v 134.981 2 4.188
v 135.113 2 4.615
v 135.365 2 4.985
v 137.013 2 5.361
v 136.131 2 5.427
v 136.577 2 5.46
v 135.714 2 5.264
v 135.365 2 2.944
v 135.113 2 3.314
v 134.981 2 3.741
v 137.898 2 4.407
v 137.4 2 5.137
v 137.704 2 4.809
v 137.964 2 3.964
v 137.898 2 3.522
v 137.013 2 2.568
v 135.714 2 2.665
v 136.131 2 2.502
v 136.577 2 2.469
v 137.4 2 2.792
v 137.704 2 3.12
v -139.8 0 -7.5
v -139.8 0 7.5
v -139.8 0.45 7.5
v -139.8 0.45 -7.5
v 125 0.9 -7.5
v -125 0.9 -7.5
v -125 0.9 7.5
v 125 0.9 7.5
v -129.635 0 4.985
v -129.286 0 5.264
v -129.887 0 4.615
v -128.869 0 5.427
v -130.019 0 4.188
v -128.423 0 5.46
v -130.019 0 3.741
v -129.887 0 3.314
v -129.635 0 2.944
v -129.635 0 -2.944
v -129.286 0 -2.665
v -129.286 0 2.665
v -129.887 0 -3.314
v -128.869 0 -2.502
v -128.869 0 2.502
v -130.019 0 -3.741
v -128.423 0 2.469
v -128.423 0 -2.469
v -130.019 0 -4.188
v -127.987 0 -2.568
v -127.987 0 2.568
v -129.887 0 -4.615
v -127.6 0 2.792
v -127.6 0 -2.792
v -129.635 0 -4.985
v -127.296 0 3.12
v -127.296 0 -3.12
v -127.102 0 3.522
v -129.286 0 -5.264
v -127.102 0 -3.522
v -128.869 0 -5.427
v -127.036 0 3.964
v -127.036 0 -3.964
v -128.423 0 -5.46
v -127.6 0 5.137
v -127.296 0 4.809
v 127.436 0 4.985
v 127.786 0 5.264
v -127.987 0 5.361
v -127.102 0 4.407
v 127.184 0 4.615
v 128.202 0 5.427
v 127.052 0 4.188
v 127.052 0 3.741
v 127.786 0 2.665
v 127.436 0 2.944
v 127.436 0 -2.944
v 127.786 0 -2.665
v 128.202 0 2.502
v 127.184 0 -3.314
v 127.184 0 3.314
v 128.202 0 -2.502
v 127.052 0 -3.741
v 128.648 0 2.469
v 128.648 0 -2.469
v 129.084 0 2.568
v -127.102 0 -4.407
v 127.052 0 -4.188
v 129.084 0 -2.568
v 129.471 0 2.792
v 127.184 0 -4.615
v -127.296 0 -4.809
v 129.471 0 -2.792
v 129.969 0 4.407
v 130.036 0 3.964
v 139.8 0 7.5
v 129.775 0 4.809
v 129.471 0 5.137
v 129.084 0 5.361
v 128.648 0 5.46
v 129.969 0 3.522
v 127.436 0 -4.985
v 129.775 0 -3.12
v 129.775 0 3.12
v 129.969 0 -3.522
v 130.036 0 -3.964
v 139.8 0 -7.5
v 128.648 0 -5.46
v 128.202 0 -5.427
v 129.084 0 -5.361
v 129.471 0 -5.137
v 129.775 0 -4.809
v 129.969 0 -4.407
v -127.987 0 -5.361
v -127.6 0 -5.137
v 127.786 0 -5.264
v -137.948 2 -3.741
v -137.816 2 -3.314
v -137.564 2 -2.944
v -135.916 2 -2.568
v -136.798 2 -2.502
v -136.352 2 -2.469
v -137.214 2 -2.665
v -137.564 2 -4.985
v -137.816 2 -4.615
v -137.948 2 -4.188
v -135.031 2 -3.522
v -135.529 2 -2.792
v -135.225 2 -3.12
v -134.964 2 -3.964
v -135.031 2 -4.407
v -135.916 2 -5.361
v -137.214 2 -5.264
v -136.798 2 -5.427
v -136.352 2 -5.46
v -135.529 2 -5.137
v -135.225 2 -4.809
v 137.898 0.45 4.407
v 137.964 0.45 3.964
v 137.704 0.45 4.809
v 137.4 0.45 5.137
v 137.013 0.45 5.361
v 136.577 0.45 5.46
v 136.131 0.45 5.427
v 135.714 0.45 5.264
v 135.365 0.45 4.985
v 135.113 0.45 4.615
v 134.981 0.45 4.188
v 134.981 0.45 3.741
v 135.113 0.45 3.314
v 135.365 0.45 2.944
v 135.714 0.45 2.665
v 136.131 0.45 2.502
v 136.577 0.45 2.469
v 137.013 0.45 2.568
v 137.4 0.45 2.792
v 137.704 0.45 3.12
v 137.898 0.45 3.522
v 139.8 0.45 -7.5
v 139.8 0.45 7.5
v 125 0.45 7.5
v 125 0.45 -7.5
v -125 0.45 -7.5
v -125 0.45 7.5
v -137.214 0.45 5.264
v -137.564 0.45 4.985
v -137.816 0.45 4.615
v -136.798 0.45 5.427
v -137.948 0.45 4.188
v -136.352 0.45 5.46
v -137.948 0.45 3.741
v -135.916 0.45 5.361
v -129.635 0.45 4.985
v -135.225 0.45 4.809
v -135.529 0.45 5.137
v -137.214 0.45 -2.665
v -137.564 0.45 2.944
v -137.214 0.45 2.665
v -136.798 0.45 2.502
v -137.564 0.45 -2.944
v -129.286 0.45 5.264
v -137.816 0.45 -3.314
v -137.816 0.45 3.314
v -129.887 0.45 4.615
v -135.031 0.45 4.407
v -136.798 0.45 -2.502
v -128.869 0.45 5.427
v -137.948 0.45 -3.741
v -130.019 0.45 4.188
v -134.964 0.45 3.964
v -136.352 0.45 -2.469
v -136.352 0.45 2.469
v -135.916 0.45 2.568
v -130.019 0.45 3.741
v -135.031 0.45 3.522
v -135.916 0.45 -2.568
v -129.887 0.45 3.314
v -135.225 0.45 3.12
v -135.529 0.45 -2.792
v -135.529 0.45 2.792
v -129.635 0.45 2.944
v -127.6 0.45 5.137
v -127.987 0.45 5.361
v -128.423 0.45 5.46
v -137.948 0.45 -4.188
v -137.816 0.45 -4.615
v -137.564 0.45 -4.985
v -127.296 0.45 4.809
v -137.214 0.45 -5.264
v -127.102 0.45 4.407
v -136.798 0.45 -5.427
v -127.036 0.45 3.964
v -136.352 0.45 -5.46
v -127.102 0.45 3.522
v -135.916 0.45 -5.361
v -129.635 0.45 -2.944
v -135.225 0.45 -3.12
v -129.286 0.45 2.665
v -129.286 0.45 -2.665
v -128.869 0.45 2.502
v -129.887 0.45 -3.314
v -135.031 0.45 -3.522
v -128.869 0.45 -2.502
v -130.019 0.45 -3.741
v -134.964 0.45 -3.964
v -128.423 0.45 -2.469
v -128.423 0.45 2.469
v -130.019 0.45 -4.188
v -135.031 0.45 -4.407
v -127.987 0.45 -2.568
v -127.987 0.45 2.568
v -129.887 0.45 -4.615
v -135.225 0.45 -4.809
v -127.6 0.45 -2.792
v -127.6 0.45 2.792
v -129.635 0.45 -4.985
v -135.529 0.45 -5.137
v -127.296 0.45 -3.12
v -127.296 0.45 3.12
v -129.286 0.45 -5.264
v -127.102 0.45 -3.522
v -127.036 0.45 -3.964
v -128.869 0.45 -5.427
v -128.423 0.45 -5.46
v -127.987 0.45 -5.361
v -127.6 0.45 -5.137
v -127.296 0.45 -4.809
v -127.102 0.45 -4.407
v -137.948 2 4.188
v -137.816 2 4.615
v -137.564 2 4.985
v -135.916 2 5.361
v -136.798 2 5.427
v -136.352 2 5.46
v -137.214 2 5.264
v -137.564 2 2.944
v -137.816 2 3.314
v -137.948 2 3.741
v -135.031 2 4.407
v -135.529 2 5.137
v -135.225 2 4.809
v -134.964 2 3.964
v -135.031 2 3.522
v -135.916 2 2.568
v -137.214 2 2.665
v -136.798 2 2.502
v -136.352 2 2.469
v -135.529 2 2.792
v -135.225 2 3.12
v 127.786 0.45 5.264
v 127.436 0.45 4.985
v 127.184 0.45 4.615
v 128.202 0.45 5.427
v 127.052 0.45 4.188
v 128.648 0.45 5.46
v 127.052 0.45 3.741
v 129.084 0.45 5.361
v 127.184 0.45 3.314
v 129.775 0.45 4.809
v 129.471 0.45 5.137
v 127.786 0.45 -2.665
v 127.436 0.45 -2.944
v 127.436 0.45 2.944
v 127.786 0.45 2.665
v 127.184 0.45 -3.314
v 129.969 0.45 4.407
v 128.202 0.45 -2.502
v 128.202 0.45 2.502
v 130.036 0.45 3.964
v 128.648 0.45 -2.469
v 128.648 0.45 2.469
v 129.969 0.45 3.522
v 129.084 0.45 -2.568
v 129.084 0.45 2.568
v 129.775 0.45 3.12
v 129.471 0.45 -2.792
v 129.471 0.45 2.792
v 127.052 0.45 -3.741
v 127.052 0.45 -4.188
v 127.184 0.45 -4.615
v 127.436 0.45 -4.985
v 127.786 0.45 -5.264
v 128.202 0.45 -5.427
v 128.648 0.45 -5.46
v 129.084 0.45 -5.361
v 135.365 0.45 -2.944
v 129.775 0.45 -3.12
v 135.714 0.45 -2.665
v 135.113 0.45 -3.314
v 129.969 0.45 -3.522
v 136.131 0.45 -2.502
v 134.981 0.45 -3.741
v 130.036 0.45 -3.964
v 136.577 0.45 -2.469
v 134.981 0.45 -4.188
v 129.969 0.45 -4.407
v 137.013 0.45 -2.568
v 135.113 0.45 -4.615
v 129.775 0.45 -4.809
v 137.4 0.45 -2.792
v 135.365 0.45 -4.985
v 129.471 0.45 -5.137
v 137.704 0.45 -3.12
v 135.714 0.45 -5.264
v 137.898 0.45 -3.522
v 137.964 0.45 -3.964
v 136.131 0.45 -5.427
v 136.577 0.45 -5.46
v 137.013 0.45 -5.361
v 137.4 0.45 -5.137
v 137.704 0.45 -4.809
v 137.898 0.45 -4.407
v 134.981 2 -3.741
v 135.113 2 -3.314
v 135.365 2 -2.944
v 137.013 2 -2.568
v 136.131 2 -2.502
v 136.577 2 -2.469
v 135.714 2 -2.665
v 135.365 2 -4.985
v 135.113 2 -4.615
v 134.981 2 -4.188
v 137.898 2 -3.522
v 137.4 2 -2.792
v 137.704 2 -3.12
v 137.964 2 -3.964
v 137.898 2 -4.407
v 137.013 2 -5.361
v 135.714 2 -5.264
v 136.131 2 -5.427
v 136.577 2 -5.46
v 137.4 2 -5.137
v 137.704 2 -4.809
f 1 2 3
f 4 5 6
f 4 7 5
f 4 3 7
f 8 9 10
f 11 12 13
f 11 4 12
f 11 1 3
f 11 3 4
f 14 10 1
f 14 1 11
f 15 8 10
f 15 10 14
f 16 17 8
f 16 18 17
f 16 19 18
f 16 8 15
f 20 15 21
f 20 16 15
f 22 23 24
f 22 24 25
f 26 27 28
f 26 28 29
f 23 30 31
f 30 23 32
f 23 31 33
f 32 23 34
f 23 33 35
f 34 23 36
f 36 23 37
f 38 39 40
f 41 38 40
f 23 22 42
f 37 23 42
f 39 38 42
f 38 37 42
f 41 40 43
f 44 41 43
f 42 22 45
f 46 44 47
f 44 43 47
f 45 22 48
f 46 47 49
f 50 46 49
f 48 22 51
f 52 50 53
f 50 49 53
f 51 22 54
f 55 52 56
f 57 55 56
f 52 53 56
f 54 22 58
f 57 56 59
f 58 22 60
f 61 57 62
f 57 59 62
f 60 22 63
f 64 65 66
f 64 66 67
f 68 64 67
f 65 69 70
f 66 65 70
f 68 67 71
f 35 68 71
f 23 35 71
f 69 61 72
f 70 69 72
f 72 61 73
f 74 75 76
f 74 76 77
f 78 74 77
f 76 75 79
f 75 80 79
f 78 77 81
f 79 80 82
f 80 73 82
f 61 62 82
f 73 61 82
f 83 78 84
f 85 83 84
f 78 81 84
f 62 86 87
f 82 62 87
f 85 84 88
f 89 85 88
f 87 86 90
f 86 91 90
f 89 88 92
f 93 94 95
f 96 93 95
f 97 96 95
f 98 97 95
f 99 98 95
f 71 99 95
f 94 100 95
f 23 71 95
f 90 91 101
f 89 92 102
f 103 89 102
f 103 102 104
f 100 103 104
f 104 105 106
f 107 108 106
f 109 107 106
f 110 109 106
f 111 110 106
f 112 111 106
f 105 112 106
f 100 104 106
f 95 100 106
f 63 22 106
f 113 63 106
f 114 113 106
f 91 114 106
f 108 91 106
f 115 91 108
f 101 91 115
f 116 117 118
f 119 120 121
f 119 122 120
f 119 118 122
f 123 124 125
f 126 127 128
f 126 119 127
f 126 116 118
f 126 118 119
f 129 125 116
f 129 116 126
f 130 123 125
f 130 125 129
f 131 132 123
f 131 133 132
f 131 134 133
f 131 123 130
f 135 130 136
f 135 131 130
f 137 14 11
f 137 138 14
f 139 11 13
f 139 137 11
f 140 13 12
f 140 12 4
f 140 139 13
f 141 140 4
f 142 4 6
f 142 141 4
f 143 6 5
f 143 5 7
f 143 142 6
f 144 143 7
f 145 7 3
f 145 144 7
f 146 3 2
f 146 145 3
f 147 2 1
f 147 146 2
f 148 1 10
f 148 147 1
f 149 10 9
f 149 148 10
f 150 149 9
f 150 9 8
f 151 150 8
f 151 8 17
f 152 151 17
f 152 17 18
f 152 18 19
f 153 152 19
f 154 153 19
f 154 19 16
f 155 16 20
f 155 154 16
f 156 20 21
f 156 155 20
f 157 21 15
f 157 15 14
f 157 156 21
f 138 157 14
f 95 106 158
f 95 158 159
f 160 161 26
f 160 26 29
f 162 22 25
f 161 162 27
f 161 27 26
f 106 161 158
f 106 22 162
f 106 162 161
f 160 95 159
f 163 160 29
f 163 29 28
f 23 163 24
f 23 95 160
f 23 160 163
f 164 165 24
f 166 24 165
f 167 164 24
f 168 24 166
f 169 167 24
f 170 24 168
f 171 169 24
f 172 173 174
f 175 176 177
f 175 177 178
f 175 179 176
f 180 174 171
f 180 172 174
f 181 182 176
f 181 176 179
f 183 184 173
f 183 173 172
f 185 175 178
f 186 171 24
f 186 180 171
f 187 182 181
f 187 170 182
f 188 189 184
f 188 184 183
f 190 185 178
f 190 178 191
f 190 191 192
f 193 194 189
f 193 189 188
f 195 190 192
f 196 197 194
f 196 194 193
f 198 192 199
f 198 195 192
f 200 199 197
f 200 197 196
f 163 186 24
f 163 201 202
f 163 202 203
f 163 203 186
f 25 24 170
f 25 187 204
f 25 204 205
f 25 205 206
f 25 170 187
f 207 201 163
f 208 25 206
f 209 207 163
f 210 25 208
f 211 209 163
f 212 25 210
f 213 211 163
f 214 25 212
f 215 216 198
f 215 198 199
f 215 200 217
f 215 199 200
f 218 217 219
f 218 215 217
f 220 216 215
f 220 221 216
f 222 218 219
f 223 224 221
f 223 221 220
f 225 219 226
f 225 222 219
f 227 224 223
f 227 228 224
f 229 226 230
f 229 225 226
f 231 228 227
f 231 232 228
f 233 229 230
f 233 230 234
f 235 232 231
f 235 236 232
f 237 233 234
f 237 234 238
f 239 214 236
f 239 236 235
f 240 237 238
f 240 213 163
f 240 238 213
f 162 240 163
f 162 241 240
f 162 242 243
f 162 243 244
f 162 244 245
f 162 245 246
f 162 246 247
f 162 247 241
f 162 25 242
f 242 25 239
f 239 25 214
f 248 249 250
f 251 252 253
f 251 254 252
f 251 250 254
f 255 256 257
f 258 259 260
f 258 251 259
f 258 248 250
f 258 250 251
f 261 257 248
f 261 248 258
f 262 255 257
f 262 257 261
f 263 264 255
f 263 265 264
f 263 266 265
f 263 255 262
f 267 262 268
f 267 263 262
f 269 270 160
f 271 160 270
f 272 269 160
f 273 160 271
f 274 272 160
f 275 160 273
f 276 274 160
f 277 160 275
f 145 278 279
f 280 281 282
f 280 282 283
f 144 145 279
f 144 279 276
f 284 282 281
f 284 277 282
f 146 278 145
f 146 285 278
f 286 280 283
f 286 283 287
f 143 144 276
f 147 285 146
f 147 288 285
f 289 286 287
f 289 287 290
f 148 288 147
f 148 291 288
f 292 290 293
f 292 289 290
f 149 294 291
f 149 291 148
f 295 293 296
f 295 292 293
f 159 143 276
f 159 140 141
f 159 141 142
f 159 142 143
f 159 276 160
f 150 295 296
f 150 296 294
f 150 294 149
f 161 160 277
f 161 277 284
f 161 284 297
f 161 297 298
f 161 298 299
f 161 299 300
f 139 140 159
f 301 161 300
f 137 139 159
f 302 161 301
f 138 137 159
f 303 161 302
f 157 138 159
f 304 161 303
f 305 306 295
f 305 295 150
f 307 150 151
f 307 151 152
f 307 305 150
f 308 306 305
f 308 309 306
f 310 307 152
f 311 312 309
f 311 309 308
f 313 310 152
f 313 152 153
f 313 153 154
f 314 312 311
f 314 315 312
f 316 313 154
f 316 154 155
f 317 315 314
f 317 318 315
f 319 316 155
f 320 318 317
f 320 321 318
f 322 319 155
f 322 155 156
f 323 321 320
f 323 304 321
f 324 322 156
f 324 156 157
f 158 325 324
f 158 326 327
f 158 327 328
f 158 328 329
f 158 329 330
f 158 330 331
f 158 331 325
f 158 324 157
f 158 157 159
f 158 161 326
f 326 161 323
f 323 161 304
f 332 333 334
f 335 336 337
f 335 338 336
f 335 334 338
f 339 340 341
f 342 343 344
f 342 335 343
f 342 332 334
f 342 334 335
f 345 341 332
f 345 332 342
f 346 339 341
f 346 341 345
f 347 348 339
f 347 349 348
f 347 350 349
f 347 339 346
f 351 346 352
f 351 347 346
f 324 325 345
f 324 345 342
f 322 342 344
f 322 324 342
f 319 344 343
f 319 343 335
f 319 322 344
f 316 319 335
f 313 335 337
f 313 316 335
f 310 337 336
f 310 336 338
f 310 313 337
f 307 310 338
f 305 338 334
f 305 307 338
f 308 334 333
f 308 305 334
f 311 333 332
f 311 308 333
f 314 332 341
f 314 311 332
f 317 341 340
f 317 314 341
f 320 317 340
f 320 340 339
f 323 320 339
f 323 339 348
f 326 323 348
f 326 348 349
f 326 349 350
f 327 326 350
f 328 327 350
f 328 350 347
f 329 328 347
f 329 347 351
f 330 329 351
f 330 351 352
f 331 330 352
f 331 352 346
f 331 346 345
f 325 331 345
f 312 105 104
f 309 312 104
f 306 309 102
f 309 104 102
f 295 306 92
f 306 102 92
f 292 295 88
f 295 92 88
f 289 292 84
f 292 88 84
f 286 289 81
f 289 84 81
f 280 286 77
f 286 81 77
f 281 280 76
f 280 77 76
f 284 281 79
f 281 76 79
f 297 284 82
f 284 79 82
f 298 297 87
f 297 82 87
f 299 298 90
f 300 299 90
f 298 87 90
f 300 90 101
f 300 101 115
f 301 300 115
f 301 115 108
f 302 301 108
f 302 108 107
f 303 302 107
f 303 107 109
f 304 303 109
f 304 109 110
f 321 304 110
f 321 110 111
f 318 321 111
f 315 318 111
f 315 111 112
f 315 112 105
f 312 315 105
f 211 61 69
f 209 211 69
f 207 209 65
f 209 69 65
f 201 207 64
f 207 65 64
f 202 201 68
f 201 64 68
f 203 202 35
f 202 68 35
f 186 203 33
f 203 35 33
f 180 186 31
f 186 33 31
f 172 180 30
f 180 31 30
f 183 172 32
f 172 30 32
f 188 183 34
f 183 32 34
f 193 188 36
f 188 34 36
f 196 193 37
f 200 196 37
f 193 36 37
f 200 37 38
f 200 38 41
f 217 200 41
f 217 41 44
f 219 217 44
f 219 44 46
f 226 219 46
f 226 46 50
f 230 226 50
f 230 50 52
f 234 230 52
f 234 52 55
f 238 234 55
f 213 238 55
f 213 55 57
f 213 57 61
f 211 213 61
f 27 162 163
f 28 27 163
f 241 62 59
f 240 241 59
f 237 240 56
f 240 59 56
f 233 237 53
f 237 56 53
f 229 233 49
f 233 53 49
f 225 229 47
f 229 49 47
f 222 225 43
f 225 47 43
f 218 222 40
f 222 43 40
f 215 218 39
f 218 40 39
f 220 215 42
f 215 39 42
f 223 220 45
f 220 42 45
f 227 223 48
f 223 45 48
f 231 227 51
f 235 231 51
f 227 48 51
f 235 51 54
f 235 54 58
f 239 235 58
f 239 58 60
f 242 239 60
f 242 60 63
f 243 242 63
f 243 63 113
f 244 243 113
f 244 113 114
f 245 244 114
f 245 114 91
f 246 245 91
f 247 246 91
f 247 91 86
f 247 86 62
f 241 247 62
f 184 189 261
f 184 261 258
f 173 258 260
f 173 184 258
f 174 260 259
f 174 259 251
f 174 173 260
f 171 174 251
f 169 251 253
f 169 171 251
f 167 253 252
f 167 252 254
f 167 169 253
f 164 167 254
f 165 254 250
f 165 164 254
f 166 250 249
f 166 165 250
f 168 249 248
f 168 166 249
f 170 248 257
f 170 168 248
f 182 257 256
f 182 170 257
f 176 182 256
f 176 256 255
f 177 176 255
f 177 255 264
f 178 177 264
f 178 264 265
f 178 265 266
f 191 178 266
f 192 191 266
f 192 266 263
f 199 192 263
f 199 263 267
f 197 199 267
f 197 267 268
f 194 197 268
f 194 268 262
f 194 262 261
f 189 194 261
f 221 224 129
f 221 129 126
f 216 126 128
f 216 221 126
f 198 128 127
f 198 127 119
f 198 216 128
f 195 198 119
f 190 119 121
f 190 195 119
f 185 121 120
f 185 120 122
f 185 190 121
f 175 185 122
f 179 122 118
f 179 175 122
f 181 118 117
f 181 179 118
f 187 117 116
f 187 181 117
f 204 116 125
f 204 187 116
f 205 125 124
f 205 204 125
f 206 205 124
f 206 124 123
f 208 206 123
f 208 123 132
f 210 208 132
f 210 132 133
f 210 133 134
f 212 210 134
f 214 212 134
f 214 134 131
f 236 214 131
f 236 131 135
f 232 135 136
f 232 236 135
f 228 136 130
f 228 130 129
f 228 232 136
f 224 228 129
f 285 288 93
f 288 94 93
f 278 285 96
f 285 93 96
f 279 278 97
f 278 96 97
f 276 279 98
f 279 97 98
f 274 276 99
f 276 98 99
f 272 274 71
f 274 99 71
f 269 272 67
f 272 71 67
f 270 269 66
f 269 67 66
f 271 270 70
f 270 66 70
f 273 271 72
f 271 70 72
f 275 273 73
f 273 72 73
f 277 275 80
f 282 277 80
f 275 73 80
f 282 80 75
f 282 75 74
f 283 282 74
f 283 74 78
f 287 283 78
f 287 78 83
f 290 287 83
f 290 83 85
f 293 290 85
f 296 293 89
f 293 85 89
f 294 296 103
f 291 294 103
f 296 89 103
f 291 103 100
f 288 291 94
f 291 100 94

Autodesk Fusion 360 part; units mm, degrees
sketch "Sketch1" plane through (0, 0, 0) normal (0, 1, 0) x (1, 0, 0)
  line L0 (140, -7.5) -> (-140, -7.5)
  line L1 (-140, -7.5) -> (-140, 7.5)
  line L2 (-140, 7.5) -> (140, 7.5)
  line L3 (140, 7.5) -> (140, -7.5)
  line L4 (140, -7.5) -> (-140, 7.5) construction
  line L5 (-140, -7.5) -> (140, 7.5) construction
  line L6 (-125, 7.5) -> (-125, -7.5)
  line L7 (-140, 7.5) -> (-125, -7.5) construction
  line L8 (-125, 7.5) -> (-140, -7.5) construction
  circle A0 centre (-136.4645, 3.9645) radius 1.5
  circle A1 centre (-128.5355, 3.9645) radius 1.5
  line L9 (1.75, 0) -> (22.5, 0)
  circle A2 centre (-136.4645, -3.9645) radius 1.5
  circle A3 centre (-128.5355, -3.9645) radius 1.5
  line L10 (0, -20) -> (0, -2.5)
  line L11 (125, 7.5) -> (125, -7.5)
  circle A4 centre (128.5355, 3.9645) radius 1.5
  circle A5 centre (128.5355, -3.9645) radius 1.5
  circle A6 centre (136.4645, -3.9645) radius 1.5
  circle A7 centre (136.4645, 3.9645) radius 1.5
  dimension "d1" = 280
  dimension "d2" = 15
  dimension "d3" = 15
  dimension "d4" = 3
  dimension "d5" = 3
  dimension "d6" = 5
  dimension "d7" = 5
extrude "Extrude1" add sketch "Sketch1" along normal blind 0.9 contours L0 L2 L6 L11
extrude "Extrude2" add sketch "Sketch1" along normal blind 0.45 contours L0 L2 L3 L11 | L0 L1 L2 L6
extrude "Extrude3" add sketch "Sketch1" along normal blind 2 contours A0 | A2 | A6 | A7
move_face "OffsetFaces1" offset -0.2 2 faces at (140, 0.15, -2.5) (-140, 0.15, 2.5)
